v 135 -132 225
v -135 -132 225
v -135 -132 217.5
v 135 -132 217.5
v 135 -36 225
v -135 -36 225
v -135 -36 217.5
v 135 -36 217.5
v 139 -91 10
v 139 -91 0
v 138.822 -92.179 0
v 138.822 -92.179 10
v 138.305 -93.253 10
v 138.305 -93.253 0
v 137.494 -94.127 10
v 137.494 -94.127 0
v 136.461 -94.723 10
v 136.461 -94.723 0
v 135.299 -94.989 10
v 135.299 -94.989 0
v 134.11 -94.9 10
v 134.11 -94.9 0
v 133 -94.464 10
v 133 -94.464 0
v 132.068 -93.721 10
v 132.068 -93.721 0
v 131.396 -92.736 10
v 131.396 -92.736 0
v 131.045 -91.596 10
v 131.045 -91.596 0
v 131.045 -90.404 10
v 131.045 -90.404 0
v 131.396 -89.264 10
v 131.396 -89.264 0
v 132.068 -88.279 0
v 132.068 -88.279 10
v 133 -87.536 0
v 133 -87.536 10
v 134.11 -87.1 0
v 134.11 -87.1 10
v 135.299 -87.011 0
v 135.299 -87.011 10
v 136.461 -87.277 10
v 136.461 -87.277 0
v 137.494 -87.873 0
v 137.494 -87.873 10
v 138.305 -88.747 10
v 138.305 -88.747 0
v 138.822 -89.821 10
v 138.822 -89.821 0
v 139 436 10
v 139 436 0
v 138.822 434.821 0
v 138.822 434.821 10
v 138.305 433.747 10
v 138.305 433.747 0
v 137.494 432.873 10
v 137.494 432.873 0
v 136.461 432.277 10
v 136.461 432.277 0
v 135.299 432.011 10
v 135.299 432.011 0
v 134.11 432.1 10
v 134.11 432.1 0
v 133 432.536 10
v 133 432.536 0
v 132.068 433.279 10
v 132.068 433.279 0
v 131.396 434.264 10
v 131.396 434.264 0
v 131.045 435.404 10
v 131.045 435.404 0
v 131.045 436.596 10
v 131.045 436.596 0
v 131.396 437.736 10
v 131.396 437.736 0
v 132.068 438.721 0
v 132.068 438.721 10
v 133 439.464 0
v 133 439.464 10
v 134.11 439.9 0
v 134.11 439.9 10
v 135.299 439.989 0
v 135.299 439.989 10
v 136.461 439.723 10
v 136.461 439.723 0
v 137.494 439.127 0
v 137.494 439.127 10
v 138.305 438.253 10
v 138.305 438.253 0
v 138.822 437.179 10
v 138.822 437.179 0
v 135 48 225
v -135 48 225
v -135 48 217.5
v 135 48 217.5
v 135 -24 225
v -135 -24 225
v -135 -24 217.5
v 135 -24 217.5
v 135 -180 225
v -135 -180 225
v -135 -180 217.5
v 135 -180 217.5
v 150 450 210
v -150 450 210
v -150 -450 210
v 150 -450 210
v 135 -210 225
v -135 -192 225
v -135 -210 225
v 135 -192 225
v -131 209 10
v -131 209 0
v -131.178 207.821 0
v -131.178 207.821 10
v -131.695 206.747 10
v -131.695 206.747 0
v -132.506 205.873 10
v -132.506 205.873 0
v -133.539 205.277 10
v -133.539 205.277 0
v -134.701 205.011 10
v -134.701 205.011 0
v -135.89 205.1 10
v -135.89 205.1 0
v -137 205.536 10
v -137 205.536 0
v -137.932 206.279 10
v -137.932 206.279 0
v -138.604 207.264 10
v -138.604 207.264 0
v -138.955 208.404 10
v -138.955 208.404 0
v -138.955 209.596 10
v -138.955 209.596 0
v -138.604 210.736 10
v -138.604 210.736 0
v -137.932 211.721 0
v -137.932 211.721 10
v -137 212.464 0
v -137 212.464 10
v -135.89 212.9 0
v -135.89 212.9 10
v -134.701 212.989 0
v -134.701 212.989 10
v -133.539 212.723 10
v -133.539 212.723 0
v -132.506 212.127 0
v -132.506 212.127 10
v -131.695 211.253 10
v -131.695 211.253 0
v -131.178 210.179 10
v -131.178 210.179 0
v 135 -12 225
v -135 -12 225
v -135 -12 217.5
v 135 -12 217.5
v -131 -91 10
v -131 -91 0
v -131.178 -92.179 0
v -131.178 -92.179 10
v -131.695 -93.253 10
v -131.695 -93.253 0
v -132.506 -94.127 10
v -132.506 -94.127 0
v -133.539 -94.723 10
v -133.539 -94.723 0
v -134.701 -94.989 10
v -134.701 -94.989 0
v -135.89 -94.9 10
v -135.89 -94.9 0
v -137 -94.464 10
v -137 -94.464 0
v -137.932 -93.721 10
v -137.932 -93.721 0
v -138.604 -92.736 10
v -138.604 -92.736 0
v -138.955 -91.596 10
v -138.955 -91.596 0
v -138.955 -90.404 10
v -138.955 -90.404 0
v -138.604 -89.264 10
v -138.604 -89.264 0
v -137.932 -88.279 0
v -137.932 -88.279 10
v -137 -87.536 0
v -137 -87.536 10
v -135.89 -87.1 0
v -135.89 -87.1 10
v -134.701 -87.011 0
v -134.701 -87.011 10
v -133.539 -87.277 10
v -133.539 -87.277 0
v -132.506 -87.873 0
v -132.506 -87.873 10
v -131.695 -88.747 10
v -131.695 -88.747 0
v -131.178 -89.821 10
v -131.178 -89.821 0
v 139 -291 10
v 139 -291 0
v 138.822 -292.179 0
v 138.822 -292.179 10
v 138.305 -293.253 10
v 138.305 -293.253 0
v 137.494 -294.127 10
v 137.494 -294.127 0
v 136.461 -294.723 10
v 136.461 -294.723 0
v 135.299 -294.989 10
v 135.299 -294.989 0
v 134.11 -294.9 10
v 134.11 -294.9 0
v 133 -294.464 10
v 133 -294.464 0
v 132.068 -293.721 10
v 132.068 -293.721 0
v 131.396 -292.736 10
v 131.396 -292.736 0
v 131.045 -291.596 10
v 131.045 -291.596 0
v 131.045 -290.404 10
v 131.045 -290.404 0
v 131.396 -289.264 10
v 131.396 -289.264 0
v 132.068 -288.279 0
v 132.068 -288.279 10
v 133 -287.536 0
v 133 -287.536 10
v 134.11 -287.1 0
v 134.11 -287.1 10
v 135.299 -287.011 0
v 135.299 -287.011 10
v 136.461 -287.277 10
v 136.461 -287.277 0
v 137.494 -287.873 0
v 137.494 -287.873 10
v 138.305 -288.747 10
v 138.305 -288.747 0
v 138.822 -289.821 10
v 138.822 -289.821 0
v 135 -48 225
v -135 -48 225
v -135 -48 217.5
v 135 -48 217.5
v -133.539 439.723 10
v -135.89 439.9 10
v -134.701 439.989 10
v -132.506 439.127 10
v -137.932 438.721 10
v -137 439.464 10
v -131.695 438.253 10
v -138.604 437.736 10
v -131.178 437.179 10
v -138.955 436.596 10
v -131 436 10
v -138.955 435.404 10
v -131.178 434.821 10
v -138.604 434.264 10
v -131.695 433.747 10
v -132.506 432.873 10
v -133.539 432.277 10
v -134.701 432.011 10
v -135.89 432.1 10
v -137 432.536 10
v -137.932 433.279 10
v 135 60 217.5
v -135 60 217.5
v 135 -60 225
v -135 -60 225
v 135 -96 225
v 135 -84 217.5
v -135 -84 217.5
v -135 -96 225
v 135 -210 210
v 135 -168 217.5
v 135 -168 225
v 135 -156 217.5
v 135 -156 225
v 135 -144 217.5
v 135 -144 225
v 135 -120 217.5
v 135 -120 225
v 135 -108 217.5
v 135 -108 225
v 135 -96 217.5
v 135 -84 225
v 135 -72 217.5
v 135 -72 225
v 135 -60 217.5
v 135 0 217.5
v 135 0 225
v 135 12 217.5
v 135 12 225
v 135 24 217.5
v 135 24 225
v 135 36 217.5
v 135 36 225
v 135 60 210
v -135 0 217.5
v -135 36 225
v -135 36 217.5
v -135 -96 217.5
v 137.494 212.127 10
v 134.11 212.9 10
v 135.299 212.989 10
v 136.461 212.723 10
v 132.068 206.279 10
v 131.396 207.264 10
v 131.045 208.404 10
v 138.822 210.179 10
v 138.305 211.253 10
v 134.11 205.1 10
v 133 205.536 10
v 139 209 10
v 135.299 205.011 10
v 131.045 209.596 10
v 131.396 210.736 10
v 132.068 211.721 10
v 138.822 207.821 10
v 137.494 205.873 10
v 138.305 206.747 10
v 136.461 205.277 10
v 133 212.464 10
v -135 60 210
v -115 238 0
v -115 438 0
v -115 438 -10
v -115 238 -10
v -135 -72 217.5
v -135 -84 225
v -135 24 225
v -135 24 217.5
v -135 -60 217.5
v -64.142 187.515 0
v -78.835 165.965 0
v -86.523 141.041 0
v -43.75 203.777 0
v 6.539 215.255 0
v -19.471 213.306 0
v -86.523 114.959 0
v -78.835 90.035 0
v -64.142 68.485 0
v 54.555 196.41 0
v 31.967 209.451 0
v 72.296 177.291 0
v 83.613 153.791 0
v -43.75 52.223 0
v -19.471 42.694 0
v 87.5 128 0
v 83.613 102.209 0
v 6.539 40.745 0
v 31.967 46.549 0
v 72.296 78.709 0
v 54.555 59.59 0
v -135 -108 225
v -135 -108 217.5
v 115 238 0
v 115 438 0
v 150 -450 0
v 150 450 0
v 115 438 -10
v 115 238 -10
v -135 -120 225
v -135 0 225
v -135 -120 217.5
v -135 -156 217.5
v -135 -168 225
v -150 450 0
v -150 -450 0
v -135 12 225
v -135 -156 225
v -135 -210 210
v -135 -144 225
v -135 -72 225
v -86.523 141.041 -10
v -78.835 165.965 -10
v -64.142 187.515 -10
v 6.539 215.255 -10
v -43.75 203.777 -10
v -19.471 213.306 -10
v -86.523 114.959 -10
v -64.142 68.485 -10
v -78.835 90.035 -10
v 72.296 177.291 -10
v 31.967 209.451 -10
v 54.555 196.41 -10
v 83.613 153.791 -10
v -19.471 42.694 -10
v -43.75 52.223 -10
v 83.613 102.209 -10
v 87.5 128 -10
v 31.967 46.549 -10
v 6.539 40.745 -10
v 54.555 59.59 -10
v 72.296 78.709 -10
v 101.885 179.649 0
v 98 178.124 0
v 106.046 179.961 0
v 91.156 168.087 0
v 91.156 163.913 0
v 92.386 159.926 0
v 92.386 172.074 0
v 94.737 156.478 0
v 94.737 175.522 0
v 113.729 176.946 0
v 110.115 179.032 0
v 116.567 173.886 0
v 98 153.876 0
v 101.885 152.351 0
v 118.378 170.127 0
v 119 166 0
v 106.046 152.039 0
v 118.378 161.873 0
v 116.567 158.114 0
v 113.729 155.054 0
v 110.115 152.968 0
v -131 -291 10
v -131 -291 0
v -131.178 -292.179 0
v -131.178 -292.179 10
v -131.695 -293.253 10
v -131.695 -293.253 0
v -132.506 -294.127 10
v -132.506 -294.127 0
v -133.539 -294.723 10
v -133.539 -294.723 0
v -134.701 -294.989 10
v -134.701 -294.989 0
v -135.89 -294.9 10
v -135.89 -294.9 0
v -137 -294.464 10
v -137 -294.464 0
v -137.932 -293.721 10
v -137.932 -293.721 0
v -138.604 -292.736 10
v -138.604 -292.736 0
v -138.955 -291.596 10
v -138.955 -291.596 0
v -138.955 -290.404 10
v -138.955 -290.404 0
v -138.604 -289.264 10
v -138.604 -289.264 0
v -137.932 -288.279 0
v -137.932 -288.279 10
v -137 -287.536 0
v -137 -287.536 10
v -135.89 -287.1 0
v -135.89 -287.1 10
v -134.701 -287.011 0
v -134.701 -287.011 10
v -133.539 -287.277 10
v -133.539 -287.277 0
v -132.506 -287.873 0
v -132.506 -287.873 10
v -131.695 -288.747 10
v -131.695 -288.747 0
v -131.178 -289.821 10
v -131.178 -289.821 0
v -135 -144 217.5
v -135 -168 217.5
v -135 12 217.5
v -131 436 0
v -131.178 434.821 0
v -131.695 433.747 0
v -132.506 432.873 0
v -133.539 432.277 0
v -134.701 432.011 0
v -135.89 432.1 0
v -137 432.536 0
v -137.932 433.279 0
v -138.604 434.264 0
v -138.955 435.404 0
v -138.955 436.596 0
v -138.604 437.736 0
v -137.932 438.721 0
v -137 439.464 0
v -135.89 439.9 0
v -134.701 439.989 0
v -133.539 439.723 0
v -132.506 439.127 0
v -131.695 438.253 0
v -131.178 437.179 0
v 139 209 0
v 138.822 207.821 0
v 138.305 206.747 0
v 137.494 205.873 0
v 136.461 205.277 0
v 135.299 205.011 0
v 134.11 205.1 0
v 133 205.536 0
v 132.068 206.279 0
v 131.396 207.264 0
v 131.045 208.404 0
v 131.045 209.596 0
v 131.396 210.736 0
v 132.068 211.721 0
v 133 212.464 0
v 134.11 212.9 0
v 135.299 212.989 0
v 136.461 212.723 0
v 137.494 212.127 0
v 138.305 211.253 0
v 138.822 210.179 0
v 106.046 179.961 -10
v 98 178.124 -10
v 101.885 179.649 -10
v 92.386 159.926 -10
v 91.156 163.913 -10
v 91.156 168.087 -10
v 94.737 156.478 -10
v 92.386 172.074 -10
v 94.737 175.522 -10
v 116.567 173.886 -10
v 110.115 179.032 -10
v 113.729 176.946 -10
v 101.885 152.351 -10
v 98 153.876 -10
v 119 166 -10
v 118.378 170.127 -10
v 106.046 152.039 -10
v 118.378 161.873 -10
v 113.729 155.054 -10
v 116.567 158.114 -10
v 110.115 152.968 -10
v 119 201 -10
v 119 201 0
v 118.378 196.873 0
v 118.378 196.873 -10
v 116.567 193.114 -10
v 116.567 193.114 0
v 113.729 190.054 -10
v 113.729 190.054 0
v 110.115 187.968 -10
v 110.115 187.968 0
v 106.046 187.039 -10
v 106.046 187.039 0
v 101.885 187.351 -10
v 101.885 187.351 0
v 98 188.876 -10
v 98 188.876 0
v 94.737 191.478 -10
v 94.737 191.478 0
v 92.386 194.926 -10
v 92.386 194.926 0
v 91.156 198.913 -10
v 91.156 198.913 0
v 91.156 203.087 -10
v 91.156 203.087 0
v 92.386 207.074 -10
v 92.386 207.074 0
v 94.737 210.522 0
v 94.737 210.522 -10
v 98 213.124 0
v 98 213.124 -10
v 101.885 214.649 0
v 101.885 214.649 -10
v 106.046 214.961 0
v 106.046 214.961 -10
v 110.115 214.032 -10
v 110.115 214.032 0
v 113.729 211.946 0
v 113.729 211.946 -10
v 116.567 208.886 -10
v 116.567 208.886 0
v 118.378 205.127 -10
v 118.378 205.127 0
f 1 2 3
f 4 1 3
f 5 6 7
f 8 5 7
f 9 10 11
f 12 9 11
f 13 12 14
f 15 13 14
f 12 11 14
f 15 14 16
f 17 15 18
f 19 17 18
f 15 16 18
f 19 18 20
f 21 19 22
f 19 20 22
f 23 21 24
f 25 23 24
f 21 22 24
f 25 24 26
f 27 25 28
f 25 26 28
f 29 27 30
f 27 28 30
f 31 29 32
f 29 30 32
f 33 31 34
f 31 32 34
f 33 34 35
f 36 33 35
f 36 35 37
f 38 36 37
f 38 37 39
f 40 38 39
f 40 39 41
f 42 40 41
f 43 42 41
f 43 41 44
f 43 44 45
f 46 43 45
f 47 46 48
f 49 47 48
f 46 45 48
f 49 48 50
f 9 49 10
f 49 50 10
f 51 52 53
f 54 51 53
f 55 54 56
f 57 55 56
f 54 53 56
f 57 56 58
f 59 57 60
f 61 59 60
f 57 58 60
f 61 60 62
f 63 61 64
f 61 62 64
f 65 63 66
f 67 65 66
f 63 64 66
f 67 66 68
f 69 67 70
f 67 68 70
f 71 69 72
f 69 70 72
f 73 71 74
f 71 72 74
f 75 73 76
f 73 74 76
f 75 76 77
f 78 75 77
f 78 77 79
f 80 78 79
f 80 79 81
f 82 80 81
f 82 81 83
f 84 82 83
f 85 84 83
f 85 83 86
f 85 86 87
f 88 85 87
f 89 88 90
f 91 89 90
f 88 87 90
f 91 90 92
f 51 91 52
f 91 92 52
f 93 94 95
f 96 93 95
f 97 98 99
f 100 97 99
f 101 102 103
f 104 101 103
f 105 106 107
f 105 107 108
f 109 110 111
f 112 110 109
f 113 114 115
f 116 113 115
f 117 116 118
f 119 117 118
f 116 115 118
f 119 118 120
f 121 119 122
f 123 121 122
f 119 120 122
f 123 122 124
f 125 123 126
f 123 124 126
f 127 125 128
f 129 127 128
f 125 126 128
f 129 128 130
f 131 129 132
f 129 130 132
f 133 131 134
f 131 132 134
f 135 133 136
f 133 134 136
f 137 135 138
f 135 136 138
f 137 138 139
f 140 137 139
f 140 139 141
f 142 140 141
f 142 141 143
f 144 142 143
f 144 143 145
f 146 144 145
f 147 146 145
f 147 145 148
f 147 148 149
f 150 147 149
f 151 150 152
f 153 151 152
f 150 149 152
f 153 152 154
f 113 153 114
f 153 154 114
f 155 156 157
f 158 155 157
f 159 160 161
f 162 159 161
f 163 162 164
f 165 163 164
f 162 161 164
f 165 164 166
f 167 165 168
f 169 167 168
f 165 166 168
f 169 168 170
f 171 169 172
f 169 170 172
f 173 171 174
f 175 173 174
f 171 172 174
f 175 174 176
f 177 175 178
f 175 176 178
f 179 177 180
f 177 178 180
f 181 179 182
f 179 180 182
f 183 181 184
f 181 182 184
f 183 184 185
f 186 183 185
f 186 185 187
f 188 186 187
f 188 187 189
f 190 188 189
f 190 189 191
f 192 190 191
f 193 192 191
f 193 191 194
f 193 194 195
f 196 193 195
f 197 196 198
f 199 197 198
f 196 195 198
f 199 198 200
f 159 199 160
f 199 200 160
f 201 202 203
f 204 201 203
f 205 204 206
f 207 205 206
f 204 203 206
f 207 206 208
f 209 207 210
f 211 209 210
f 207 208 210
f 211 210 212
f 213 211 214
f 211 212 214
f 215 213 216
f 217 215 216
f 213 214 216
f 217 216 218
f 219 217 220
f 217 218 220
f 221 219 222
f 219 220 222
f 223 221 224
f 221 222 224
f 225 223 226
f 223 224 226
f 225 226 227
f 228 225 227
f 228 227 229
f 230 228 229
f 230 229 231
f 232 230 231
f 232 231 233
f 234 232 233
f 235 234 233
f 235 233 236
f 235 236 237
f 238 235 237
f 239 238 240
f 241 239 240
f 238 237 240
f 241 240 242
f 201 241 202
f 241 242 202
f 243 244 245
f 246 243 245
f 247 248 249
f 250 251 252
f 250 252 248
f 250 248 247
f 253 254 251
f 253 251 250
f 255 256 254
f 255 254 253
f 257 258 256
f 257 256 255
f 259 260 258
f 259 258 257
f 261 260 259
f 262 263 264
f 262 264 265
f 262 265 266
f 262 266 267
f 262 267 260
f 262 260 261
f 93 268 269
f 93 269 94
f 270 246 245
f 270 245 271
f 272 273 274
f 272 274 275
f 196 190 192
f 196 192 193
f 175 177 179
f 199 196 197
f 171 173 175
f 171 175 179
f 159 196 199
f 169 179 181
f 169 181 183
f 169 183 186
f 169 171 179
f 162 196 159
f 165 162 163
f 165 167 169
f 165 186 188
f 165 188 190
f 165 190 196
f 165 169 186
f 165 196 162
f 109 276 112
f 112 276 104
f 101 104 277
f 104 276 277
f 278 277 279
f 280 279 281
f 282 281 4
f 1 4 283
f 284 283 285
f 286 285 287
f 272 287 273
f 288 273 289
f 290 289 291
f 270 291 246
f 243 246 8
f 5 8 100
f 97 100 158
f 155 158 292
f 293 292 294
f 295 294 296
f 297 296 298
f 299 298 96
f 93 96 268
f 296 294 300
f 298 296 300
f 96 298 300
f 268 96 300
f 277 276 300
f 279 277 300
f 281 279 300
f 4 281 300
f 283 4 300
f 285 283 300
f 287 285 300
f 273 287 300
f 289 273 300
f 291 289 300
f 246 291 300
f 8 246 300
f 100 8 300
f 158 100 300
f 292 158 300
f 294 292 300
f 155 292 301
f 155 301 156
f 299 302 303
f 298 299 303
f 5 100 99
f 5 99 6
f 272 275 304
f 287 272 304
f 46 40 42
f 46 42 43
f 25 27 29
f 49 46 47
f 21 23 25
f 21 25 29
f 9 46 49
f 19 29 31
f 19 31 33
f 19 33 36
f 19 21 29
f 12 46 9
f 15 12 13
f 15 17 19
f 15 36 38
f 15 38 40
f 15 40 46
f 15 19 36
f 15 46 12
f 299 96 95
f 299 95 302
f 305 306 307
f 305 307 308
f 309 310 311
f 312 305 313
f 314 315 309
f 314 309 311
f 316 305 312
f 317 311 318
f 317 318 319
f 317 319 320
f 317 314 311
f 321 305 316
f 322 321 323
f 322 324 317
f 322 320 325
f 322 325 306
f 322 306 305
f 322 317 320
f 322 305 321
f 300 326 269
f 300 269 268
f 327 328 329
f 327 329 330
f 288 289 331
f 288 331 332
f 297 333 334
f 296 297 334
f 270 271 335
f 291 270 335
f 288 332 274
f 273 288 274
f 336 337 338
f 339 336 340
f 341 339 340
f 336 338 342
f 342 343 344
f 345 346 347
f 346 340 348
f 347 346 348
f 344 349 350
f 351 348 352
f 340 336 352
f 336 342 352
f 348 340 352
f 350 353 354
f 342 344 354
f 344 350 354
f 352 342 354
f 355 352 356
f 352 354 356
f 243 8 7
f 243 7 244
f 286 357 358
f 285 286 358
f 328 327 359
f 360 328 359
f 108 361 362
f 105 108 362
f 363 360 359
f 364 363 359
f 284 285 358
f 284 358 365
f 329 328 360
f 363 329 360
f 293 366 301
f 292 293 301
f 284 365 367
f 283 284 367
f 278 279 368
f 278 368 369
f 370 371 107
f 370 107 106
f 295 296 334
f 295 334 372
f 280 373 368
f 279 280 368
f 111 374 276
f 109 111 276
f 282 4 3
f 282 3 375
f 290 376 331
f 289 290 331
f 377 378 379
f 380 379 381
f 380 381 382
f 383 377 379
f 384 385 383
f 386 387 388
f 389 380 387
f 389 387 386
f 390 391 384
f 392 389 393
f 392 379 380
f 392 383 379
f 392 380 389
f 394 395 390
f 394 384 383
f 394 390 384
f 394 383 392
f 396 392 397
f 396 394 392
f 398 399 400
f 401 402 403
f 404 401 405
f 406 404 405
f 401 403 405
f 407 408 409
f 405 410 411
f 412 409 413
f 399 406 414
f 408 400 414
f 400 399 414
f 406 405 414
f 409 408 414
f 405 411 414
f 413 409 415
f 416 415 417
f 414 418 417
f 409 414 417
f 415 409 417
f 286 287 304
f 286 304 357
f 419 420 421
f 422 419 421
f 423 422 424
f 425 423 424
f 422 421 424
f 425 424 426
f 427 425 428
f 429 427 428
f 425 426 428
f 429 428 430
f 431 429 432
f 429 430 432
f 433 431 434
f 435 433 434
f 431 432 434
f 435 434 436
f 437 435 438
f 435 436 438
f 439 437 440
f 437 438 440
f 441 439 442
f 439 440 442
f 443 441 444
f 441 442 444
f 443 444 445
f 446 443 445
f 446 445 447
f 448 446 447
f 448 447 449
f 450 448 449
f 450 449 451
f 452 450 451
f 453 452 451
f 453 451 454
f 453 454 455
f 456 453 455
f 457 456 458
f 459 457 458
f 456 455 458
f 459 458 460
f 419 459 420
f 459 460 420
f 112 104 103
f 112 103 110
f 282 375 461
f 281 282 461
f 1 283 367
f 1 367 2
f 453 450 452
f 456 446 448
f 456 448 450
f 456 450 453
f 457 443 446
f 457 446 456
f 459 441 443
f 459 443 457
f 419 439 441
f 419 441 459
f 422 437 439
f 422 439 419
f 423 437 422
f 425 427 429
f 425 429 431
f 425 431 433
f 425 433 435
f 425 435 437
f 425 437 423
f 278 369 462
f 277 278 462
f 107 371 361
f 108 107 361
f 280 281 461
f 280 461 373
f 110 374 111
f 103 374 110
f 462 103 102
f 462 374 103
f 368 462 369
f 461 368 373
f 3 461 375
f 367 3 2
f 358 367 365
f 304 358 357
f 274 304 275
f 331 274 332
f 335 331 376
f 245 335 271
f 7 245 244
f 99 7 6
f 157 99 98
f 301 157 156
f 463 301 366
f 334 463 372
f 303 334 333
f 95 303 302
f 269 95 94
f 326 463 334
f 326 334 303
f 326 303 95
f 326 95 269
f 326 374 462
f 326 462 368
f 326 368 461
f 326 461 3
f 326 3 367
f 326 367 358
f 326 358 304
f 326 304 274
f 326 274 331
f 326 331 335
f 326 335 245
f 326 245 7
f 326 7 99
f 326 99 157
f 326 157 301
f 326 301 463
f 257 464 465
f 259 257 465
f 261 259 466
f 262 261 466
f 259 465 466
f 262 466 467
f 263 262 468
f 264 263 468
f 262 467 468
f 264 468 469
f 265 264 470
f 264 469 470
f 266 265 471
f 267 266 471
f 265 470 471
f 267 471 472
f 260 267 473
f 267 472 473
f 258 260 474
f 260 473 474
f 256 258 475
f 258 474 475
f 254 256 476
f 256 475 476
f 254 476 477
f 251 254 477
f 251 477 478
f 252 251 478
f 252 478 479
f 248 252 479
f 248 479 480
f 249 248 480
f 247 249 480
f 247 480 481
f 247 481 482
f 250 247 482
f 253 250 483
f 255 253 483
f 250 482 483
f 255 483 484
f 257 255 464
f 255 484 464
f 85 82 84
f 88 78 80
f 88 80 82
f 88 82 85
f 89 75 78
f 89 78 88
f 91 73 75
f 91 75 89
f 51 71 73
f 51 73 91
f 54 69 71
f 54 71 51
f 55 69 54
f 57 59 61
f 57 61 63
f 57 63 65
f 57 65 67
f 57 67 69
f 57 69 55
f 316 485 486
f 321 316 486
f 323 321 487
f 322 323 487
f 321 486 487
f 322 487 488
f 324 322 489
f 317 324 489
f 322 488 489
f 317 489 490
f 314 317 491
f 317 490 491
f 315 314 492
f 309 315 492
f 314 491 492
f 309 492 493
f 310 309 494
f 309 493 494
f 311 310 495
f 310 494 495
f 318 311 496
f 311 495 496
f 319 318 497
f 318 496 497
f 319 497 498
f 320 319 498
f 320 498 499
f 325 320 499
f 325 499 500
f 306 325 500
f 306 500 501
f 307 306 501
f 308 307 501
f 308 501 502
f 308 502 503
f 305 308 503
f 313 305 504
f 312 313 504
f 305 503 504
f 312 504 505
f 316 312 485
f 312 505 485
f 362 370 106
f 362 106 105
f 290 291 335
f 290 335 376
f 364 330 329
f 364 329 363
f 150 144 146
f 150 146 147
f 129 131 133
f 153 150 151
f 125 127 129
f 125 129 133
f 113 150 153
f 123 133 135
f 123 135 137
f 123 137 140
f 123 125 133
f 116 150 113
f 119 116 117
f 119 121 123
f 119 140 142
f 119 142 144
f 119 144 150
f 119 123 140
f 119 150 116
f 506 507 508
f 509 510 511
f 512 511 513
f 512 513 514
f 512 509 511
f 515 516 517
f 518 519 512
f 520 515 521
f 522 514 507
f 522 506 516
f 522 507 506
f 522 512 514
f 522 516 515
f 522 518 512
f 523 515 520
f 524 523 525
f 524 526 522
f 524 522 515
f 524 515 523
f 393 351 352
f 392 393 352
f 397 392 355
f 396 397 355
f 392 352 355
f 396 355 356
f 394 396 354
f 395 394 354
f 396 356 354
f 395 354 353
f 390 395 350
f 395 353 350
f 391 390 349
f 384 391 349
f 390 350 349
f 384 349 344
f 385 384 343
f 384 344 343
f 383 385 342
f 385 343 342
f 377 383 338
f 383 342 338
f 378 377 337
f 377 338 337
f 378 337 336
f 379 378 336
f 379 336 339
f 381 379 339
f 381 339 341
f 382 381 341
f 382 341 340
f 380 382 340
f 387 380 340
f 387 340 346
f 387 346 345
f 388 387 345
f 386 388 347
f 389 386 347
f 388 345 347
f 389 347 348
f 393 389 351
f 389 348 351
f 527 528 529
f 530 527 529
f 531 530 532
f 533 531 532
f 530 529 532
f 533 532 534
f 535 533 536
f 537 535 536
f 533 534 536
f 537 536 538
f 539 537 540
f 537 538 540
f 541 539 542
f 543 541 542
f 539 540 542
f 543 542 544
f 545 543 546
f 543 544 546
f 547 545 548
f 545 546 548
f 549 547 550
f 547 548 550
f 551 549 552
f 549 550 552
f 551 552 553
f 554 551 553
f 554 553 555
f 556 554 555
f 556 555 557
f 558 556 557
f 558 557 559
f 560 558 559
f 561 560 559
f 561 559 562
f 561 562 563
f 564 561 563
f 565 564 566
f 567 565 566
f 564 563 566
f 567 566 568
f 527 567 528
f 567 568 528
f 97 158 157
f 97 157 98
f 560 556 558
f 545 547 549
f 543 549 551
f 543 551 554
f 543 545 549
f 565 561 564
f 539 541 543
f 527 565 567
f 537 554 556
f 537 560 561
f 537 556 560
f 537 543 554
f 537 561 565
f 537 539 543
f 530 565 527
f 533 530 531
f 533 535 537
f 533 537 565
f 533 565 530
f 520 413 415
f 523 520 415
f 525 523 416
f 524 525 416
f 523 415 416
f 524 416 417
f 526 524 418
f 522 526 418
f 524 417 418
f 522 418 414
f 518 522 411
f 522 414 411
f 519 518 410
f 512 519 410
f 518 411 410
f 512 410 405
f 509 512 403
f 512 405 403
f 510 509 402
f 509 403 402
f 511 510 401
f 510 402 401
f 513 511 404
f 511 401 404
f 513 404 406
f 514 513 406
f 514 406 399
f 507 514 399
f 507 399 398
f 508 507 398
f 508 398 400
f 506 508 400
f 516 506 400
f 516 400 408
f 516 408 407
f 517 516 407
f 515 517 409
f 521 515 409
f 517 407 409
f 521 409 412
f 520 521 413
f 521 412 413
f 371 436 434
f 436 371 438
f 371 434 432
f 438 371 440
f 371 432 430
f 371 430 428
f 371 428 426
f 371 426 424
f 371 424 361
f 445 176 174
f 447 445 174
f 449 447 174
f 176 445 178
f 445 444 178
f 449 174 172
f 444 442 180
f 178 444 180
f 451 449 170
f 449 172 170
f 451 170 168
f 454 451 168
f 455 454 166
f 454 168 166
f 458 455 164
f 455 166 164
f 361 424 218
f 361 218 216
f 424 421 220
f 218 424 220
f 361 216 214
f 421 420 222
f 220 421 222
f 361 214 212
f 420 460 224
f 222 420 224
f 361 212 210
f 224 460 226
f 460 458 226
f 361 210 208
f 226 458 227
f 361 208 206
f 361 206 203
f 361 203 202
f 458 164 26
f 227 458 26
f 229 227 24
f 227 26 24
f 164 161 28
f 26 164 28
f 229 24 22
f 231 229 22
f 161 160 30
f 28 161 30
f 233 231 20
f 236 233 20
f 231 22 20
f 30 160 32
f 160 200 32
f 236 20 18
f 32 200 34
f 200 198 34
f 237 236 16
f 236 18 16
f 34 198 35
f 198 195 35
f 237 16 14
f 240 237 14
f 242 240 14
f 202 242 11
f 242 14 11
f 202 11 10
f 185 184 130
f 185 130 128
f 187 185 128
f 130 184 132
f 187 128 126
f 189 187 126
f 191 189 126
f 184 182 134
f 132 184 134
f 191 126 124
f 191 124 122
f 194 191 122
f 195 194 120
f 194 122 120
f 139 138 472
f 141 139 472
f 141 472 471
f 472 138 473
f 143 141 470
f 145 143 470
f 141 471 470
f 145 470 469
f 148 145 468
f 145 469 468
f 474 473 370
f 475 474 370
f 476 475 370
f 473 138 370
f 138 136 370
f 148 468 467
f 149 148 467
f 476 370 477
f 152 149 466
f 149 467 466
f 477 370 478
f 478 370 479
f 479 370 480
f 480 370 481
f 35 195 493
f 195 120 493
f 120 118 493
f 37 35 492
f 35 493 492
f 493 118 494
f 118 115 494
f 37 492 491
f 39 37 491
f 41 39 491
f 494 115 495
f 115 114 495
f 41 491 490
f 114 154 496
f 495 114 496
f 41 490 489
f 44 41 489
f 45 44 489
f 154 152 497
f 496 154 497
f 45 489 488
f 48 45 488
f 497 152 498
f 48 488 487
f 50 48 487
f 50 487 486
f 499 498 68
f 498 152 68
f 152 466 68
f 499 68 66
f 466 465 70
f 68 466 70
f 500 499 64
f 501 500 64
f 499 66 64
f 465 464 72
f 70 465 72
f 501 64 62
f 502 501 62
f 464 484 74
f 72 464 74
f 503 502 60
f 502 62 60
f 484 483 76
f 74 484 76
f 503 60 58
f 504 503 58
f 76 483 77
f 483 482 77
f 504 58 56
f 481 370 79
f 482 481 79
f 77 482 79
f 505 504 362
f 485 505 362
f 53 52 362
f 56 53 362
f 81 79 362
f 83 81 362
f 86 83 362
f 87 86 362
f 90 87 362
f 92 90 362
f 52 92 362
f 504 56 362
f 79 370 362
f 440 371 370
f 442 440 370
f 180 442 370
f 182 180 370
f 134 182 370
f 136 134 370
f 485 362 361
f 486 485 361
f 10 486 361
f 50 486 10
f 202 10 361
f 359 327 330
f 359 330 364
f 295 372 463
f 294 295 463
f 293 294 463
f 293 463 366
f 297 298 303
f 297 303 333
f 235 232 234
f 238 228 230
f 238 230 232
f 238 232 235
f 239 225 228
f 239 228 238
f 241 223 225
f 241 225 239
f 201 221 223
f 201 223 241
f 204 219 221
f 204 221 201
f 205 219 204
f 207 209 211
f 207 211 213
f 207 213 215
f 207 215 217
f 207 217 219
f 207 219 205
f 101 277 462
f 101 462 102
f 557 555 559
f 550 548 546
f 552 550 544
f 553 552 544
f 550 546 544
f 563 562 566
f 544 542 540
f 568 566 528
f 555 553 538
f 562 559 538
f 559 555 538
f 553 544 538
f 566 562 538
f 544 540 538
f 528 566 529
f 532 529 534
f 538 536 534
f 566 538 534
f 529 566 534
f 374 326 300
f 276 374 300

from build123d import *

# Parameters (mm, degrees)
F0_W     = 300
F0_H     = 900
F1_DEPTH = 210
F2_W     = 270
F2_H     = 270
F3_DEPTH = 15
F5_DEPTH = 312.33499
F6_W     = 230
F6_H     = 200
F6_R     = 87.5
F6_R_2   = 14
F7_DEPTH = 10
F6_R_3   = 4
F8_DEPTH = 10


with BuildPart() as f1:
    # F0 (on Top) → F1 (new body)
    with BuildSketch(Plane.XY):
        Rectangle(F0_W, F0_H)
    extrude(amount=F1_DEPTH)

    # F6 (on face) → F8 (cut)
    with BuildSketch(Plane(origin=(0, 0, 0), x_dir=(1, 0, 0), z_dir=(0, 0, -1))):
        with Locations((135, -436)):
            Circle(F6_R_3)
        with Locations((135, -209)):
            Circle(F6_R_3)
        with Locations((135, 91)):
            Circle(F6_R_3)
        with Locations((135, 291)):
            Circle(F6_R_3)
        with Locations((-135, 291)):
            Circle(F6_R_3)
        with Locations((-135, 91)):
            Circle(F6_R_3)
        with Locations((-135, -209)):
            Circle(F6_R_3)
        with Locations((-135, -436)):
            Circle(F6_R_3)
    extrude(amount=-F8_DEPTH, mode=Mode.SUBTRACT)


with BuildPart() as f3:
    # F2 (on face) → F3 (new body)
    with BuildSketch(Plane.XY.offset(210)):
        with Locations((0, -75)):
            Rectangle(F2_W, F2_H)
    extrude(amount=F3_DEPTH)

    # F4 (on face) → F5 (cut)
    with BuildSketch(Plane(origin=(-135, 0, 0), x_dir=(0, -1, 0), z_dir=(-1, 0, 0))):
        Polygon((-68.766557, 217.5), (-60, 217.5), (-48, 225), (-48, 217.5), (-36, 225), (-36, 217.5), (-24, 225), (-24, 217.5), (-12, 225), (-12, 217.5), (0, 225), (0, 217.5), (12, 225), (12, 217.5), (24, 225), (24, 217.5), (36, 225), (36, 217.5), (48, 225), (48, 217.5), (60, 225), (60, 217.5), (72, 225), (72, 217.5), (84, 225), (84, 217.5), (96, 225), (96, 217.5), (108, 225), (108, 217.5), (120, 225), (120, 217.5), (132, 225), (132, 217.5), (144, 225), (144, 217.5), (156, 225), (156, 217.5), (168, 225), (168, 217.5), (180, 225), (180, 217.5), (192, 225), (192, 249.122769), (-68.766557, 249.122769), align=None)
    extrude(amount=-F5_DEPTH, mode=Mode.SUBTRACT)


with BuildPart() as f7:
    # F6 (on face) → F7 (new body)
    with BuildSketch(Plane(origin=(0, 0, 0), x_dir=(1, 0, 0), z_dir=(0, 0, -1))):
        with Locations((0, -338)):
            Rectangle(F6_W, F6_H)
        with Locations((0, -128)):
            Circle(F6_R)
        with Locations((105, -201)):
            Circle(F6_R_2)
        with Locations((105, -166)):
            Circle(F6_R_2)
    extrude(amount=F7_DEPTH)


solid = Compound([f1.part, f3.part, f7.part])
